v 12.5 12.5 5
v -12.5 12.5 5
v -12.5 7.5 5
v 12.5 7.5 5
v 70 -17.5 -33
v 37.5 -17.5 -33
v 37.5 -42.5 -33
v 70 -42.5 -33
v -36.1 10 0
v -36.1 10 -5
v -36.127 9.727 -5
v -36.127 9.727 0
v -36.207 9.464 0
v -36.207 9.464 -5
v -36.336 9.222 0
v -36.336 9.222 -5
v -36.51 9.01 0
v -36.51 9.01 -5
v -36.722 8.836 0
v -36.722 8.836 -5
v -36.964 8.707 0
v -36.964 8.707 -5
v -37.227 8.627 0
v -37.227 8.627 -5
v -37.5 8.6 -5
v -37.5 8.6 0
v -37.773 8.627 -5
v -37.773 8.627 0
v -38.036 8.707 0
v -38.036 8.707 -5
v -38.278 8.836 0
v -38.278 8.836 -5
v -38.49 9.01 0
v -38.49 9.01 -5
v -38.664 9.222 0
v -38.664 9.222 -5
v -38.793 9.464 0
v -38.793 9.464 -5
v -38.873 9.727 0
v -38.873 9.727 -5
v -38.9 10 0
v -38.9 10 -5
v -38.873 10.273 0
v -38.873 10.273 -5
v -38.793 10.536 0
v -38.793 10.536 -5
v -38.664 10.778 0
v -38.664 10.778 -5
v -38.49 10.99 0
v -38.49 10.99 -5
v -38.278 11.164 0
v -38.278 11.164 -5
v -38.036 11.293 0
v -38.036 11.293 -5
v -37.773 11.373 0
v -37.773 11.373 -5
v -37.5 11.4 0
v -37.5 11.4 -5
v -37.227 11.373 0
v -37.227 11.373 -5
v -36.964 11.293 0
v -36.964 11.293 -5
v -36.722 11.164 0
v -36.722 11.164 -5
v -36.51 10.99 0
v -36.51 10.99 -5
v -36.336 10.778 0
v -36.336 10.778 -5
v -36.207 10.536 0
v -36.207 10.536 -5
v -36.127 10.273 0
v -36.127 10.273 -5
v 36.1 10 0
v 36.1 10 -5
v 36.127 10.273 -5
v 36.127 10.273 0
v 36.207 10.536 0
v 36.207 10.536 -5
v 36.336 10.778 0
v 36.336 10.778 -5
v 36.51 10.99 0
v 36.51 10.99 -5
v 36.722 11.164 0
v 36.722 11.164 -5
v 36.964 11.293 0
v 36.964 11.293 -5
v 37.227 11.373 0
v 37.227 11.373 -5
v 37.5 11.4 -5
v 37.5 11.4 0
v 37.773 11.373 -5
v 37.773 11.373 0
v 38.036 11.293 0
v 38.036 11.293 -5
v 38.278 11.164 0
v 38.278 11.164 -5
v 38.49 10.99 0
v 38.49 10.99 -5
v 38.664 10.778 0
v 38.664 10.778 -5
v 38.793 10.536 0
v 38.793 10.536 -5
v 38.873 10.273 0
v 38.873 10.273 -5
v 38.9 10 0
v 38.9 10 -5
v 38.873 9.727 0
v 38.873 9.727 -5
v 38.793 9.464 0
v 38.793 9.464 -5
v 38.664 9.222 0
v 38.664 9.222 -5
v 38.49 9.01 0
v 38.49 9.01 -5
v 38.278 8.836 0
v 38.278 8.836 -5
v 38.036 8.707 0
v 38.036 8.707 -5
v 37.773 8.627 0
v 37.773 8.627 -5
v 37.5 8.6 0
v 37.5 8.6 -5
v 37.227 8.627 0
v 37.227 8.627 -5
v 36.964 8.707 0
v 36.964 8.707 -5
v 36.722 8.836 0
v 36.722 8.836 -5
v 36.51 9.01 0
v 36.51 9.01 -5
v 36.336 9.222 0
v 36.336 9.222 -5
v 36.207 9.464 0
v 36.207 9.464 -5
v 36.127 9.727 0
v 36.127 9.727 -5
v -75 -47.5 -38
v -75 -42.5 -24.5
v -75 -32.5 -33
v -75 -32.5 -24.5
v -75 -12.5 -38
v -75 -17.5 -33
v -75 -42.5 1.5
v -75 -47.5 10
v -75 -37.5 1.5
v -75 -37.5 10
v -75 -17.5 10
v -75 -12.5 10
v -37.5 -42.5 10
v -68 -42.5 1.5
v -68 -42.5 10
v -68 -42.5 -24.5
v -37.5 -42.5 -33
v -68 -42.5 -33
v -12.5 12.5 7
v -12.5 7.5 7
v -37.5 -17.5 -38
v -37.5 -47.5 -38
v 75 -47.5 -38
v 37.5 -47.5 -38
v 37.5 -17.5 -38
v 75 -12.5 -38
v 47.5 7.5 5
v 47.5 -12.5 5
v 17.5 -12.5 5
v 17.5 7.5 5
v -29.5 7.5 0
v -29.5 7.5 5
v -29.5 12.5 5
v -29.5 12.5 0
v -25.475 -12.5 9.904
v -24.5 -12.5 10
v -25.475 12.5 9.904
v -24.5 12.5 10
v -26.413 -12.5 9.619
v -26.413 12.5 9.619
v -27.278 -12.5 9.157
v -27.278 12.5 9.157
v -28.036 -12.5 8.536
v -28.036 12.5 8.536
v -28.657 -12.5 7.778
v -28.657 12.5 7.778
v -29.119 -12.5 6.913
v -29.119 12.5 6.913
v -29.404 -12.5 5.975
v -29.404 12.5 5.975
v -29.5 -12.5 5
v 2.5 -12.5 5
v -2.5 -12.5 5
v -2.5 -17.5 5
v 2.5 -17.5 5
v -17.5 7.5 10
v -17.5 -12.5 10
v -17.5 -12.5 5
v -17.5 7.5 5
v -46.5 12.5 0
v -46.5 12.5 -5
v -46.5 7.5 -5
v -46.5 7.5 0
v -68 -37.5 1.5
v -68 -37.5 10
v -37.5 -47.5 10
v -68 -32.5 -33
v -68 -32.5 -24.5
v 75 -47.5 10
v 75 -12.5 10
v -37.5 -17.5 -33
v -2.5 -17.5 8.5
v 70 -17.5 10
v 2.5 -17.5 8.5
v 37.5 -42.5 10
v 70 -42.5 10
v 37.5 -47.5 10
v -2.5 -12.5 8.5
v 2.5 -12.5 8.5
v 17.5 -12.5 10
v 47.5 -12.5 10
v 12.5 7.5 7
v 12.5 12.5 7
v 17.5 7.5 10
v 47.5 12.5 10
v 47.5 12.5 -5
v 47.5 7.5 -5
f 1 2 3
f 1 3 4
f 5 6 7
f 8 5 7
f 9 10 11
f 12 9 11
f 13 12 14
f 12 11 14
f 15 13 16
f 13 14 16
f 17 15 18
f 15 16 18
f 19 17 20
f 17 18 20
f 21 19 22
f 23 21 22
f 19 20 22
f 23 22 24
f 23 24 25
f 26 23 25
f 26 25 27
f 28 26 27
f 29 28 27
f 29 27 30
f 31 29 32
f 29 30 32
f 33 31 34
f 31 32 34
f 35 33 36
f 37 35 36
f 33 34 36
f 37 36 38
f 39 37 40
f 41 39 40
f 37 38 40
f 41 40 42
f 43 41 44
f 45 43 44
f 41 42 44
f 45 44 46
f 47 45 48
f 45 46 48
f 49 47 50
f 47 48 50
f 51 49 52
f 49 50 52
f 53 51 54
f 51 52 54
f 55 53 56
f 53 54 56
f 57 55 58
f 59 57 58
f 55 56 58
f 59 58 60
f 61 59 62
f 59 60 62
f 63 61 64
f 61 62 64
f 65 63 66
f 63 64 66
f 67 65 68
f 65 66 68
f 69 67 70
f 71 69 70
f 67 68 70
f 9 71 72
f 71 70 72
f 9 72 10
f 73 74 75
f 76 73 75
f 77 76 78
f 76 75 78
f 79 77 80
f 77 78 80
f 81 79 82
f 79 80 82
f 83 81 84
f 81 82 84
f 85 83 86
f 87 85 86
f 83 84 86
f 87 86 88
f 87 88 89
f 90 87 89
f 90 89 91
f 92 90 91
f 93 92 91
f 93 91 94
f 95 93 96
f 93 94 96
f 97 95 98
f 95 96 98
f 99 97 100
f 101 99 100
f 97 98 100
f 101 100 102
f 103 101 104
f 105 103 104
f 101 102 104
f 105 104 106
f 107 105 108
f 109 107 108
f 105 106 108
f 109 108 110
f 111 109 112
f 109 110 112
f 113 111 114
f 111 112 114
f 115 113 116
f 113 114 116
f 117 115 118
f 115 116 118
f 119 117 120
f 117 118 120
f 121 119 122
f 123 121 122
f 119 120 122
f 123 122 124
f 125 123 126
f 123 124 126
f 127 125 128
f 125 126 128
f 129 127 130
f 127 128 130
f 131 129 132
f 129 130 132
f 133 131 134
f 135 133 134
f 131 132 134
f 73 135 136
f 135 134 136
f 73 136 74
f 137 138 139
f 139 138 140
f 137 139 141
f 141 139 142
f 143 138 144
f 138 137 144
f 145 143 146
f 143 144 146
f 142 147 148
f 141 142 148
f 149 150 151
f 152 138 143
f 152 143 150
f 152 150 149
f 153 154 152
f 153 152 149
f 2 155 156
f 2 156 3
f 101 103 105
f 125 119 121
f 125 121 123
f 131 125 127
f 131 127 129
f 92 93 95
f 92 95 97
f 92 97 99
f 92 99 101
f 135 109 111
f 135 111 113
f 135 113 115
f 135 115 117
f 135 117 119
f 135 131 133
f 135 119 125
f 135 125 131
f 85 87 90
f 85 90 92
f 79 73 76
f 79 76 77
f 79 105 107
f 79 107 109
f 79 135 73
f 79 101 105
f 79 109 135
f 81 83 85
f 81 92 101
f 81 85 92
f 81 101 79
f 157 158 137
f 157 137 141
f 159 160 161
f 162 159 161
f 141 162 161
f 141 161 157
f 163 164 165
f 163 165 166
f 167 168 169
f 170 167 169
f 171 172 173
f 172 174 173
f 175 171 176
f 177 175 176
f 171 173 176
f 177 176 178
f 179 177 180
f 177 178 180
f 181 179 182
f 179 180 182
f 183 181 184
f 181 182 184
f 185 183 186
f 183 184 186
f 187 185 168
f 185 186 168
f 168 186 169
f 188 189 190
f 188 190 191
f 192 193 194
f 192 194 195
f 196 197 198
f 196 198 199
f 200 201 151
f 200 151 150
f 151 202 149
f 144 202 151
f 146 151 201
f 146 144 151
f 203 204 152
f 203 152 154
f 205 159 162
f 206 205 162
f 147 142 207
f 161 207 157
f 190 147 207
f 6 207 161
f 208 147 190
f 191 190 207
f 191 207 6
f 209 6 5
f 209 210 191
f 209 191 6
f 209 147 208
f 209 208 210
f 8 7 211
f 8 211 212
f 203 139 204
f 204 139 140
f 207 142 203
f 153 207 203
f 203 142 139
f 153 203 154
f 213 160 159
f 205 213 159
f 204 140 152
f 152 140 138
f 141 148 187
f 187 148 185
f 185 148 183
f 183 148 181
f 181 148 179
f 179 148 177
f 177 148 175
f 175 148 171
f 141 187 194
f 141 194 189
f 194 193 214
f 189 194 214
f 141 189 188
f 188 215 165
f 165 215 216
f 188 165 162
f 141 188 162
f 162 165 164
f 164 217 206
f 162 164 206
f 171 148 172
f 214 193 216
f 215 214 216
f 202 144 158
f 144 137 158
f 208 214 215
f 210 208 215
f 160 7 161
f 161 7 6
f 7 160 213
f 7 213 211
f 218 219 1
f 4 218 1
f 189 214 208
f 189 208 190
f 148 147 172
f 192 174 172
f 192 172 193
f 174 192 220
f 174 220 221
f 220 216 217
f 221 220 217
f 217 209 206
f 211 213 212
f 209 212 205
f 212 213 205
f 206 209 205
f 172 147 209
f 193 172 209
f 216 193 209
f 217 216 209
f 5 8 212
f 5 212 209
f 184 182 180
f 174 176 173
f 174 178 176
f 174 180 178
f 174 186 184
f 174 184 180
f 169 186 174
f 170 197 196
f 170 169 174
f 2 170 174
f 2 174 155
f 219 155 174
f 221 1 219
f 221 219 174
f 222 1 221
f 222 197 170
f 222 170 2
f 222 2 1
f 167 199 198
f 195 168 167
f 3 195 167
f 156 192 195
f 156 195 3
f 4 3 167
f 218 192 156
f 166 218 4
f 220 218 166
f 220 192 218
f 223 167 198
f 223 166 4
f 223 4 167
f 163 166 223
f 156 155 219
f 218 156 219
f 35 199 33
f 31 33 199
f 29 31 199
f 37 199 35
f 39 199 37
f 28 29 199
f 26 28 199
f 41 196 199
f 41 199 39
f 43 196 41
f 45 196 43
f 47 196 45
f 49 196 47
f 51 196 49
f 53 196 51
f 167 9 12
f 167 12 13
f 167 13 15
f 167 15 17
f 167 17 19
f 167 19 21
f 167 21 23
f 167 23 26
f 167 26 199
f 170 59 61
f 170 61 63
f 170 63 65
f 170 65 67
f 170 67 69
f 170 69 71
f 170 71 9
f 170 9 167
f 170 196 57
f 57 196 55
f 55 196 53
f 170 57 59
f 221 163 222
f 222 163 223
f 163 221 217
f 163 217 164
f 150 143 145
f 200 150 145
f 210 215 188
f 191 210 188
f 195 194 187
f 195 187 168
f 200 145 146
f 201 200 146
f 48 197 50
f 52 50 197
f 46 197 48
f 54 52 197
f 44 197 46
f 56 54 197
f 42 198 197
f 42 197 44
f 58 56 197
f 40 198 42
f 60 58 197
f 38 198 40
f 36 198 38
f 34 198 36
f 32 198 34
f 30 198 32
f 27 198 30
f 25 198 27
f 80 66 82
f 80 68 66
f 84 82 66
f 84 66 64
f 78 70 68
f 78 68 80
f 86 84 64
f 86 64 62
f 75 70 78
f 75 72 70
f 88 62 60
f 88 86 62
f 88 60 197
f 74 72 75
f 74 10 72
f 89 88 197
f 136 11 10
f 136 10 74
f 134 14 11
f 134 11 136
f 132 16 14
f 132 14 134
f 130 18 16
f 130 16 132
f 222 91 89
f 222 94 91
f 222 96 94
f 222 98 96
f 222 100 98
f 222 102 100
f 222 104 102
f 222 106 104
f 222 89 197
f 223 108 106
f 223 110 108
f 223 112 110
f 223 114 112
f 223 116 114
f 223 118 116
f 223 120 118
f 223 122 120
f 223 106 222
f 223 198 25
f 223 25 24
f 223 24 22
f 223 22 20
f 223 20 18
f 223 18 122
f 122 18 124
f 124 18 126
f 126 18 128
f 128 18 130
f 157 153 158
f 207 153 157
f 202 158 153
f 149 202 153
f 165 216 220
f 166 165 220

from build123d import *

# Parameters (mm, degrees)
CROQUIS1_W                  = 7.5
CROQUIS1_H                  = 15
CROQUIS1_W_2                = 95
CROQUIS1_H_2                = 3
SALIENTE_EXTRUIR1_DEPTH     = 5
CROQUIS2_W                  = 95
CROQUIS2_H                  = 3
SALIENTE_EXTRUIR2_DEPTH     = 5
CROQUIS5_W                  = 5
CROQUIS5_H                  = 15
CORTAR_EXTRUIR2_DEPTH       = 96.709194961
CROQUIS6_W                  = 5
CROQUIS6_H                  = 23
SALIENTE_EXTRUIR3_DEPTH     = 95
CROQUIS7_W                  = 35
CROQUIS7_H                  = 20
CORTAR_EXTRUIR3_DEPTH       = 52.35659646
CROQUIS9_W                  = 165
CROQUIS9_H                  = 40
SALIENTE_EXTRUIR4_DEPTH     = 50
CROQUIS15_W                 = 95
CROQUIS15_H                 = 15
SALIENTE_EXTRUIR7_DEPTH     = 2
CROQUIS16_R                 = 1.4
CORTAR_EXTRUIR7_DEPTH       = 5
CROQUIS18_W                 = 25
CROQUIS18_H                 = 2
CORTAR_EXTRUIR9_DEPTH       = 5
CORTAR_EXTRUIR10_DEPTH      = 112.719514858
CORTAR_EXTRUIR10_DEPTH_BACK = 43
CROQUIS19_W                 = 140
CROQUIS19_H                 = 25
CROQUIS20_W                 = 10
CROQUIS20_H                 = 35
CROQUIS20_H_2               = 5
CROQUIS20_W_2               = 150
CROQUIS20_W_3               = 5
CORTAR_EXTRUIR11_DEPTH      = 112.719514858
CROQUIS23_W                 = 2
CROQUIS23_H                 = 35
CORTAR_EXTRUIR12_DEPTH      = 163.346080951
CORTAR_EXTRUIR13_DEPTH      = 5
CROQUIS25_W                 = 8
CROQUIS25_H                 = 8
CROQUIS25_W_2               = 5
CROQUIS25_H_2               = 5
SALIENTE_EXTRUIR8_DEPTH     = 5
CROQUIS27_W                 = 5
CROQUIS27_H                 = 3.5
CORTAR_EXTRUIR14_DEPTH      = 5
CROQUIS28_W                 = 8.5
CROQUIS28_H                 = 10
SALIENTE_EXTRUIR9_DEPTH     = 2
CROQUIS29_W                 = 75
CROQUIS29_H                 = 30
CORTAR_EXTRUIR15_DEPTH      = 105.170533262
CROQUIS30_W                 = 8.5
CROQUIS30_H                 = 5
CORTAR_EXTRUIR16_DEPTH      = 7
CROQUIS31_W                 = 18
CROQUIS31_H                 = 25
CORTAR_EXTRUIR17_DEPTH      = 10
CROQUIS32_W                 = 5
CROQUIS32_H                 = 5
CORTAR_EXTRUIR18_DEPTH      = 1
REDONDEO4_R                 = 5


with BuildPart() as part:
    # Croquis1 → Saliente-Extruir1 (new body)
    with BuildSketch(Plane.XY):
        with Locations((43.75, 0)):
            Rectangle(CROQUIS1_W, CROQUIS1_H)
        with Locations((0, 9)):
            Rectangle(CROQUIS1_W_2, CROQUIS1_H_2)
        with Locations((-43.75, 0)):
            Rectangle(CROQUIS1_W, CROQUIS1_H)
    extrude(amount=SALIENTE_EXTRUIR1_DEPTH)

    # Croquis2 → Saliente-Extruir2 (add)
    with BuildSketch(Plane(origin=(0, 0, 0), x_dir=(-1, 0, 0), z_dir=(0, 0, -1))):
        with Locations((0, 9)):
            Rectangle(CROQUIS2_W, CROQUIS2_H)
    extrude(amount=SALIENTE_EXTRUIR2_DEPTH)

    # Croquis5 → Cortar-Extruir2 (cut, through all)
    with BuildSketch(Plane(origin=(47.5, 0, 0), x_dir=(0, 0, -1), z_dir=(1, 0, 0))):
        with Locations((-2.5, 0)):
            Rectangle(CROQUIS5_W, CROQUIS5_H)
    extrude(amount=-CORTAR_EXTRUIR2_DEPTH, mode=Mode.SUBTRACT)

    # Croquis6 → Saliente-Extruir3 (add, through all)
    with BuildSketch(Plane(origin=(47.5, 0, 0), x_dir=(0, 0, -1), z_dir=(1, 0, 0))):
        with Locations((-7.5, -1)):
            Rectangle(CROQUIS6_W, CROQUIS6_H)
    extrude(amount=-SALIENTE_EXTRUIR3_DEPTH)

    # Croquis7 → Cortar-Extruir3 (cut, through all)
    with BuildSketch(Plane.XY.offset(10)):
        with Locations((0, -2.5)):
            Rectangle(CROQUIS7_W, CROQUIS7_H)
    extrude(amount=-CORTAR_EXTRUIR3_DEPTH, mode=Mode.SUBTRACT)

    # Croquis9 → Saliente-Extruir4 (add)
    with BuildSketch(Plane.XY.offset(10)):
        with Locations((-2.5, -32.5)):
            Rectangle(CROQUIS9_W, CROQUIS9_H)
    extrude(amount=-SALIENTE_EXTRUIR4_DEPTH)

    # Croquis15 → Saliente-Extruir7 (add)
    with BuildSketch(Plane(origin=(0, 10.5, 0), x_dir=(1, 0, 0), z_dir=(0, 1, 0))):
        with Locations((0, -2.5)):
            Rectangle(CROQUIS15_W, CROQUIS15_H)
    extrude(amount=SALIENTE_EXTRUIR7_DEPTH)

    # Croquis16 → Cortar-Extruir7 (cut)
    with BuildSketch(Plane(origin=(0, 0, -5), x_dir=(-1, 0, 0), z_dir=(0, 0, -1))):
        with Locations((-37.5, 10)):
            Circle(CROQUIS16_R)
        with Locations(Location((37.5, 10, 0), (0, 0, 180))):
            Circle(CROQUIS16_R)
    extrude(amount=-CORTAR_EXTRUIR7_DEPTH, mode=Mode.SUBTRACT)

    # Croquis18 → Cortar-Extruir9 (cut)
    with BuildSketch(Plane(origin=(0, 12.5, 0), x_dir=(1, 0, 0), z_dir=(0, 1, 0))):
        with Locations((0, -6)):
            Rectangle(CROQUIS18_W, CROQUIS18_H)
    extrude(amount=-CORTAR_EXTRUIR9_DEPTH, mode=Mode.SUBTRACT)

    # Croquis19 → Cortar-Extruir10 (cut, two sides: drawn at the far end of the back side and taken through both)
    with BuildSketch(Plane.XY.offset(10).offset(-CORTAR_EXTRUIR10_DEPTH_BACK)):
        with Locations((0, -30)):
            Rectangle(CROQUIS19_W, CROQUIS19_H)
    extrude(amount=CORTAR_EXTRUIR10_DEPTH + CORTAR_EXTRUIR10_DEPTH_BACK, mode=Mode.SUBTRACT)

    # Croquis20 → Cortar-Extruir11 (cut, through all)
    with BuildSketch(Plane.XY.offset(10)):
        with Locations((-80, -30)):
            Rectangle(CROQUIS20_W, CROQUIS20_H)
        with Locations((-80, -50)):
            Rectangle(CROQUIS20_W, CROQUIS20_H_2)
        with Locations((0, -50)):
            Rectangle(CROQUIS20_W_2, CROQUIS20_H_2)
        with Locations((77.5, -50)):
            Rectangle(CROQUIS20_W_3, CROQUIS20_H_2)
        with Locations((77.5, -30)):
            Rectangle(CROQUIS20_W_3, CROQUIS20_H)
    extrude(amount=-CORTAR_EXTRUIR11_DEPTH, mode=Mode.SUBTRACT)

    # Croquis23 → Cortar-Extruir12 (cut, through all)
    with BuildSketch(Plane(origin=(75, 0, 0), x_dir=(0, 0, -1), z_dir=(1, 0, 0))):
        with Locations((39, -30)):
            Rectangle(CROQUIS23_W, CROQUIS23_H)
    extrude(amount=-CORTAR_EXTRUIR12_DEPTH, mode=Mode.SUBTRACT)

    # Croquis24 → Cortar-Extruir13 (cut)
    with BuildSketch(Plane.ZY.offset(75)):
        Polygon((10, -32.5), (10, -17.5), (-33, -17.5), (-33, -32.5), (-24.5, -32.5), (-24.5, -42.5), (1.5, -42.5), (1.5, -32.5), align=None)
    extrude(amount=-CORTAR_EXTRUIR13_DEPTH, mode=Mode.SUBTRACT)

    # Croquis25 → Saliente-Extruir8 (add, through all)
    with BuildSketch(Plane(origin=(0, -42.5, 0), x_dir=(1, 0, 0), z_dir=(0, 1, 0))):
        with Locations((0, -12.5)):
            Rectangle(CROQUIS25_W, CROQUIS25_H)
        with Locations((0, -12.5)):
            Rectangle(CROQUIS25_W_2, CROQUIS25_H_2, mode=Mode.SUBTRACT)
    extrude(amount=-SALIENTE_EXTRUIR8_DEPTH)

    # Croquis27 → Cortar-Extruir14 (cut)
    with BuildSketch(Plane(origin=(0, -12.5, 0), x_dir=(1, 0, 0), z_dir=(0, 1, 0))):
        with Locations((0, -6.75)):
            Rectangle(CROQUIS27_W, CROQUIS27_H)
    extrude(amount=-CORTAR_EXTRUIR14_DEPTH, mode=Mode.SUBTRACT)

    # Croquis28 → Saliente-Extruir9 (add)
    with BuildSketch(Plane(origin=(-70, 0, 0), x_dir=(0, 0, -1), z_dir=(1, 0, 0))):
        with Locations((-5.75, -37.5)):
            Rectangle(CROQUIS28_W, CROQUIS28_H)
        with Locations((28.75, -37.5)):
            Rectangle(CROQUIS28_W, CROQUIS28_H)
    extrude(amount=SALIENTE_EXTRUIR9_DEPTH)

    # Croquis29 → Cortar-Extruir15 (cut, through all)
    with BuildSketch(Plane.XY.offset(16.5)):
        with Locations((0, -32.5)):
            Rectangle(CROQUIS29_W, CROQUIS29_H)
    extrude(amount=-CORTAR_EXTRUIR15_DEPTH, mode=Mode.SUBTRACT)

    # Croquis30 → Cortar-Extruir16 (cut)
    with BuildSketch(Plane.ZY.offset(75)):
        with Locations((5.75, -35)):
            Rectangle(CROQUIS30_W, CROQUIS30_H)
    extrude(amount=-CORTAR_EXTRUIR16_DEPTH, mode=Mode.SUBTRACT)

    # Croquis31 → Cortar-Extruir17 (cut)
    with BuildSketch(Plane.XY.offset(10)):
        with Locations((-38.5, 0)):
            Rectangle(CROQUIS31_W, CROQUIS31_H)
    extrude(amount=-CORTAR_EXTRUIR17_DEPTH, mode=Mode.SUBTRACT)

    # Croquis32 → Cortar-Extruir18 (cut)
    with BuildSketch(Plane.ZY.offset(47.5)):
        with Locations((-2.5, 10)):
            Rectangle(CROQUIS32_W, CROQUIS32_H)
    extrude(amount=-CORTAR_EXTRUIR18_DEPTH, mode=Mode.SUBTRACT)

    # Redondeo4
    redondeo4_edges = [part.edges().sort_by_distance(p)[0] for p in [
        (-29.5, 0, 10),
    ]]
    fillet(redondeo4_edges, radius=REDONDEO4_R)


solid = part.part
